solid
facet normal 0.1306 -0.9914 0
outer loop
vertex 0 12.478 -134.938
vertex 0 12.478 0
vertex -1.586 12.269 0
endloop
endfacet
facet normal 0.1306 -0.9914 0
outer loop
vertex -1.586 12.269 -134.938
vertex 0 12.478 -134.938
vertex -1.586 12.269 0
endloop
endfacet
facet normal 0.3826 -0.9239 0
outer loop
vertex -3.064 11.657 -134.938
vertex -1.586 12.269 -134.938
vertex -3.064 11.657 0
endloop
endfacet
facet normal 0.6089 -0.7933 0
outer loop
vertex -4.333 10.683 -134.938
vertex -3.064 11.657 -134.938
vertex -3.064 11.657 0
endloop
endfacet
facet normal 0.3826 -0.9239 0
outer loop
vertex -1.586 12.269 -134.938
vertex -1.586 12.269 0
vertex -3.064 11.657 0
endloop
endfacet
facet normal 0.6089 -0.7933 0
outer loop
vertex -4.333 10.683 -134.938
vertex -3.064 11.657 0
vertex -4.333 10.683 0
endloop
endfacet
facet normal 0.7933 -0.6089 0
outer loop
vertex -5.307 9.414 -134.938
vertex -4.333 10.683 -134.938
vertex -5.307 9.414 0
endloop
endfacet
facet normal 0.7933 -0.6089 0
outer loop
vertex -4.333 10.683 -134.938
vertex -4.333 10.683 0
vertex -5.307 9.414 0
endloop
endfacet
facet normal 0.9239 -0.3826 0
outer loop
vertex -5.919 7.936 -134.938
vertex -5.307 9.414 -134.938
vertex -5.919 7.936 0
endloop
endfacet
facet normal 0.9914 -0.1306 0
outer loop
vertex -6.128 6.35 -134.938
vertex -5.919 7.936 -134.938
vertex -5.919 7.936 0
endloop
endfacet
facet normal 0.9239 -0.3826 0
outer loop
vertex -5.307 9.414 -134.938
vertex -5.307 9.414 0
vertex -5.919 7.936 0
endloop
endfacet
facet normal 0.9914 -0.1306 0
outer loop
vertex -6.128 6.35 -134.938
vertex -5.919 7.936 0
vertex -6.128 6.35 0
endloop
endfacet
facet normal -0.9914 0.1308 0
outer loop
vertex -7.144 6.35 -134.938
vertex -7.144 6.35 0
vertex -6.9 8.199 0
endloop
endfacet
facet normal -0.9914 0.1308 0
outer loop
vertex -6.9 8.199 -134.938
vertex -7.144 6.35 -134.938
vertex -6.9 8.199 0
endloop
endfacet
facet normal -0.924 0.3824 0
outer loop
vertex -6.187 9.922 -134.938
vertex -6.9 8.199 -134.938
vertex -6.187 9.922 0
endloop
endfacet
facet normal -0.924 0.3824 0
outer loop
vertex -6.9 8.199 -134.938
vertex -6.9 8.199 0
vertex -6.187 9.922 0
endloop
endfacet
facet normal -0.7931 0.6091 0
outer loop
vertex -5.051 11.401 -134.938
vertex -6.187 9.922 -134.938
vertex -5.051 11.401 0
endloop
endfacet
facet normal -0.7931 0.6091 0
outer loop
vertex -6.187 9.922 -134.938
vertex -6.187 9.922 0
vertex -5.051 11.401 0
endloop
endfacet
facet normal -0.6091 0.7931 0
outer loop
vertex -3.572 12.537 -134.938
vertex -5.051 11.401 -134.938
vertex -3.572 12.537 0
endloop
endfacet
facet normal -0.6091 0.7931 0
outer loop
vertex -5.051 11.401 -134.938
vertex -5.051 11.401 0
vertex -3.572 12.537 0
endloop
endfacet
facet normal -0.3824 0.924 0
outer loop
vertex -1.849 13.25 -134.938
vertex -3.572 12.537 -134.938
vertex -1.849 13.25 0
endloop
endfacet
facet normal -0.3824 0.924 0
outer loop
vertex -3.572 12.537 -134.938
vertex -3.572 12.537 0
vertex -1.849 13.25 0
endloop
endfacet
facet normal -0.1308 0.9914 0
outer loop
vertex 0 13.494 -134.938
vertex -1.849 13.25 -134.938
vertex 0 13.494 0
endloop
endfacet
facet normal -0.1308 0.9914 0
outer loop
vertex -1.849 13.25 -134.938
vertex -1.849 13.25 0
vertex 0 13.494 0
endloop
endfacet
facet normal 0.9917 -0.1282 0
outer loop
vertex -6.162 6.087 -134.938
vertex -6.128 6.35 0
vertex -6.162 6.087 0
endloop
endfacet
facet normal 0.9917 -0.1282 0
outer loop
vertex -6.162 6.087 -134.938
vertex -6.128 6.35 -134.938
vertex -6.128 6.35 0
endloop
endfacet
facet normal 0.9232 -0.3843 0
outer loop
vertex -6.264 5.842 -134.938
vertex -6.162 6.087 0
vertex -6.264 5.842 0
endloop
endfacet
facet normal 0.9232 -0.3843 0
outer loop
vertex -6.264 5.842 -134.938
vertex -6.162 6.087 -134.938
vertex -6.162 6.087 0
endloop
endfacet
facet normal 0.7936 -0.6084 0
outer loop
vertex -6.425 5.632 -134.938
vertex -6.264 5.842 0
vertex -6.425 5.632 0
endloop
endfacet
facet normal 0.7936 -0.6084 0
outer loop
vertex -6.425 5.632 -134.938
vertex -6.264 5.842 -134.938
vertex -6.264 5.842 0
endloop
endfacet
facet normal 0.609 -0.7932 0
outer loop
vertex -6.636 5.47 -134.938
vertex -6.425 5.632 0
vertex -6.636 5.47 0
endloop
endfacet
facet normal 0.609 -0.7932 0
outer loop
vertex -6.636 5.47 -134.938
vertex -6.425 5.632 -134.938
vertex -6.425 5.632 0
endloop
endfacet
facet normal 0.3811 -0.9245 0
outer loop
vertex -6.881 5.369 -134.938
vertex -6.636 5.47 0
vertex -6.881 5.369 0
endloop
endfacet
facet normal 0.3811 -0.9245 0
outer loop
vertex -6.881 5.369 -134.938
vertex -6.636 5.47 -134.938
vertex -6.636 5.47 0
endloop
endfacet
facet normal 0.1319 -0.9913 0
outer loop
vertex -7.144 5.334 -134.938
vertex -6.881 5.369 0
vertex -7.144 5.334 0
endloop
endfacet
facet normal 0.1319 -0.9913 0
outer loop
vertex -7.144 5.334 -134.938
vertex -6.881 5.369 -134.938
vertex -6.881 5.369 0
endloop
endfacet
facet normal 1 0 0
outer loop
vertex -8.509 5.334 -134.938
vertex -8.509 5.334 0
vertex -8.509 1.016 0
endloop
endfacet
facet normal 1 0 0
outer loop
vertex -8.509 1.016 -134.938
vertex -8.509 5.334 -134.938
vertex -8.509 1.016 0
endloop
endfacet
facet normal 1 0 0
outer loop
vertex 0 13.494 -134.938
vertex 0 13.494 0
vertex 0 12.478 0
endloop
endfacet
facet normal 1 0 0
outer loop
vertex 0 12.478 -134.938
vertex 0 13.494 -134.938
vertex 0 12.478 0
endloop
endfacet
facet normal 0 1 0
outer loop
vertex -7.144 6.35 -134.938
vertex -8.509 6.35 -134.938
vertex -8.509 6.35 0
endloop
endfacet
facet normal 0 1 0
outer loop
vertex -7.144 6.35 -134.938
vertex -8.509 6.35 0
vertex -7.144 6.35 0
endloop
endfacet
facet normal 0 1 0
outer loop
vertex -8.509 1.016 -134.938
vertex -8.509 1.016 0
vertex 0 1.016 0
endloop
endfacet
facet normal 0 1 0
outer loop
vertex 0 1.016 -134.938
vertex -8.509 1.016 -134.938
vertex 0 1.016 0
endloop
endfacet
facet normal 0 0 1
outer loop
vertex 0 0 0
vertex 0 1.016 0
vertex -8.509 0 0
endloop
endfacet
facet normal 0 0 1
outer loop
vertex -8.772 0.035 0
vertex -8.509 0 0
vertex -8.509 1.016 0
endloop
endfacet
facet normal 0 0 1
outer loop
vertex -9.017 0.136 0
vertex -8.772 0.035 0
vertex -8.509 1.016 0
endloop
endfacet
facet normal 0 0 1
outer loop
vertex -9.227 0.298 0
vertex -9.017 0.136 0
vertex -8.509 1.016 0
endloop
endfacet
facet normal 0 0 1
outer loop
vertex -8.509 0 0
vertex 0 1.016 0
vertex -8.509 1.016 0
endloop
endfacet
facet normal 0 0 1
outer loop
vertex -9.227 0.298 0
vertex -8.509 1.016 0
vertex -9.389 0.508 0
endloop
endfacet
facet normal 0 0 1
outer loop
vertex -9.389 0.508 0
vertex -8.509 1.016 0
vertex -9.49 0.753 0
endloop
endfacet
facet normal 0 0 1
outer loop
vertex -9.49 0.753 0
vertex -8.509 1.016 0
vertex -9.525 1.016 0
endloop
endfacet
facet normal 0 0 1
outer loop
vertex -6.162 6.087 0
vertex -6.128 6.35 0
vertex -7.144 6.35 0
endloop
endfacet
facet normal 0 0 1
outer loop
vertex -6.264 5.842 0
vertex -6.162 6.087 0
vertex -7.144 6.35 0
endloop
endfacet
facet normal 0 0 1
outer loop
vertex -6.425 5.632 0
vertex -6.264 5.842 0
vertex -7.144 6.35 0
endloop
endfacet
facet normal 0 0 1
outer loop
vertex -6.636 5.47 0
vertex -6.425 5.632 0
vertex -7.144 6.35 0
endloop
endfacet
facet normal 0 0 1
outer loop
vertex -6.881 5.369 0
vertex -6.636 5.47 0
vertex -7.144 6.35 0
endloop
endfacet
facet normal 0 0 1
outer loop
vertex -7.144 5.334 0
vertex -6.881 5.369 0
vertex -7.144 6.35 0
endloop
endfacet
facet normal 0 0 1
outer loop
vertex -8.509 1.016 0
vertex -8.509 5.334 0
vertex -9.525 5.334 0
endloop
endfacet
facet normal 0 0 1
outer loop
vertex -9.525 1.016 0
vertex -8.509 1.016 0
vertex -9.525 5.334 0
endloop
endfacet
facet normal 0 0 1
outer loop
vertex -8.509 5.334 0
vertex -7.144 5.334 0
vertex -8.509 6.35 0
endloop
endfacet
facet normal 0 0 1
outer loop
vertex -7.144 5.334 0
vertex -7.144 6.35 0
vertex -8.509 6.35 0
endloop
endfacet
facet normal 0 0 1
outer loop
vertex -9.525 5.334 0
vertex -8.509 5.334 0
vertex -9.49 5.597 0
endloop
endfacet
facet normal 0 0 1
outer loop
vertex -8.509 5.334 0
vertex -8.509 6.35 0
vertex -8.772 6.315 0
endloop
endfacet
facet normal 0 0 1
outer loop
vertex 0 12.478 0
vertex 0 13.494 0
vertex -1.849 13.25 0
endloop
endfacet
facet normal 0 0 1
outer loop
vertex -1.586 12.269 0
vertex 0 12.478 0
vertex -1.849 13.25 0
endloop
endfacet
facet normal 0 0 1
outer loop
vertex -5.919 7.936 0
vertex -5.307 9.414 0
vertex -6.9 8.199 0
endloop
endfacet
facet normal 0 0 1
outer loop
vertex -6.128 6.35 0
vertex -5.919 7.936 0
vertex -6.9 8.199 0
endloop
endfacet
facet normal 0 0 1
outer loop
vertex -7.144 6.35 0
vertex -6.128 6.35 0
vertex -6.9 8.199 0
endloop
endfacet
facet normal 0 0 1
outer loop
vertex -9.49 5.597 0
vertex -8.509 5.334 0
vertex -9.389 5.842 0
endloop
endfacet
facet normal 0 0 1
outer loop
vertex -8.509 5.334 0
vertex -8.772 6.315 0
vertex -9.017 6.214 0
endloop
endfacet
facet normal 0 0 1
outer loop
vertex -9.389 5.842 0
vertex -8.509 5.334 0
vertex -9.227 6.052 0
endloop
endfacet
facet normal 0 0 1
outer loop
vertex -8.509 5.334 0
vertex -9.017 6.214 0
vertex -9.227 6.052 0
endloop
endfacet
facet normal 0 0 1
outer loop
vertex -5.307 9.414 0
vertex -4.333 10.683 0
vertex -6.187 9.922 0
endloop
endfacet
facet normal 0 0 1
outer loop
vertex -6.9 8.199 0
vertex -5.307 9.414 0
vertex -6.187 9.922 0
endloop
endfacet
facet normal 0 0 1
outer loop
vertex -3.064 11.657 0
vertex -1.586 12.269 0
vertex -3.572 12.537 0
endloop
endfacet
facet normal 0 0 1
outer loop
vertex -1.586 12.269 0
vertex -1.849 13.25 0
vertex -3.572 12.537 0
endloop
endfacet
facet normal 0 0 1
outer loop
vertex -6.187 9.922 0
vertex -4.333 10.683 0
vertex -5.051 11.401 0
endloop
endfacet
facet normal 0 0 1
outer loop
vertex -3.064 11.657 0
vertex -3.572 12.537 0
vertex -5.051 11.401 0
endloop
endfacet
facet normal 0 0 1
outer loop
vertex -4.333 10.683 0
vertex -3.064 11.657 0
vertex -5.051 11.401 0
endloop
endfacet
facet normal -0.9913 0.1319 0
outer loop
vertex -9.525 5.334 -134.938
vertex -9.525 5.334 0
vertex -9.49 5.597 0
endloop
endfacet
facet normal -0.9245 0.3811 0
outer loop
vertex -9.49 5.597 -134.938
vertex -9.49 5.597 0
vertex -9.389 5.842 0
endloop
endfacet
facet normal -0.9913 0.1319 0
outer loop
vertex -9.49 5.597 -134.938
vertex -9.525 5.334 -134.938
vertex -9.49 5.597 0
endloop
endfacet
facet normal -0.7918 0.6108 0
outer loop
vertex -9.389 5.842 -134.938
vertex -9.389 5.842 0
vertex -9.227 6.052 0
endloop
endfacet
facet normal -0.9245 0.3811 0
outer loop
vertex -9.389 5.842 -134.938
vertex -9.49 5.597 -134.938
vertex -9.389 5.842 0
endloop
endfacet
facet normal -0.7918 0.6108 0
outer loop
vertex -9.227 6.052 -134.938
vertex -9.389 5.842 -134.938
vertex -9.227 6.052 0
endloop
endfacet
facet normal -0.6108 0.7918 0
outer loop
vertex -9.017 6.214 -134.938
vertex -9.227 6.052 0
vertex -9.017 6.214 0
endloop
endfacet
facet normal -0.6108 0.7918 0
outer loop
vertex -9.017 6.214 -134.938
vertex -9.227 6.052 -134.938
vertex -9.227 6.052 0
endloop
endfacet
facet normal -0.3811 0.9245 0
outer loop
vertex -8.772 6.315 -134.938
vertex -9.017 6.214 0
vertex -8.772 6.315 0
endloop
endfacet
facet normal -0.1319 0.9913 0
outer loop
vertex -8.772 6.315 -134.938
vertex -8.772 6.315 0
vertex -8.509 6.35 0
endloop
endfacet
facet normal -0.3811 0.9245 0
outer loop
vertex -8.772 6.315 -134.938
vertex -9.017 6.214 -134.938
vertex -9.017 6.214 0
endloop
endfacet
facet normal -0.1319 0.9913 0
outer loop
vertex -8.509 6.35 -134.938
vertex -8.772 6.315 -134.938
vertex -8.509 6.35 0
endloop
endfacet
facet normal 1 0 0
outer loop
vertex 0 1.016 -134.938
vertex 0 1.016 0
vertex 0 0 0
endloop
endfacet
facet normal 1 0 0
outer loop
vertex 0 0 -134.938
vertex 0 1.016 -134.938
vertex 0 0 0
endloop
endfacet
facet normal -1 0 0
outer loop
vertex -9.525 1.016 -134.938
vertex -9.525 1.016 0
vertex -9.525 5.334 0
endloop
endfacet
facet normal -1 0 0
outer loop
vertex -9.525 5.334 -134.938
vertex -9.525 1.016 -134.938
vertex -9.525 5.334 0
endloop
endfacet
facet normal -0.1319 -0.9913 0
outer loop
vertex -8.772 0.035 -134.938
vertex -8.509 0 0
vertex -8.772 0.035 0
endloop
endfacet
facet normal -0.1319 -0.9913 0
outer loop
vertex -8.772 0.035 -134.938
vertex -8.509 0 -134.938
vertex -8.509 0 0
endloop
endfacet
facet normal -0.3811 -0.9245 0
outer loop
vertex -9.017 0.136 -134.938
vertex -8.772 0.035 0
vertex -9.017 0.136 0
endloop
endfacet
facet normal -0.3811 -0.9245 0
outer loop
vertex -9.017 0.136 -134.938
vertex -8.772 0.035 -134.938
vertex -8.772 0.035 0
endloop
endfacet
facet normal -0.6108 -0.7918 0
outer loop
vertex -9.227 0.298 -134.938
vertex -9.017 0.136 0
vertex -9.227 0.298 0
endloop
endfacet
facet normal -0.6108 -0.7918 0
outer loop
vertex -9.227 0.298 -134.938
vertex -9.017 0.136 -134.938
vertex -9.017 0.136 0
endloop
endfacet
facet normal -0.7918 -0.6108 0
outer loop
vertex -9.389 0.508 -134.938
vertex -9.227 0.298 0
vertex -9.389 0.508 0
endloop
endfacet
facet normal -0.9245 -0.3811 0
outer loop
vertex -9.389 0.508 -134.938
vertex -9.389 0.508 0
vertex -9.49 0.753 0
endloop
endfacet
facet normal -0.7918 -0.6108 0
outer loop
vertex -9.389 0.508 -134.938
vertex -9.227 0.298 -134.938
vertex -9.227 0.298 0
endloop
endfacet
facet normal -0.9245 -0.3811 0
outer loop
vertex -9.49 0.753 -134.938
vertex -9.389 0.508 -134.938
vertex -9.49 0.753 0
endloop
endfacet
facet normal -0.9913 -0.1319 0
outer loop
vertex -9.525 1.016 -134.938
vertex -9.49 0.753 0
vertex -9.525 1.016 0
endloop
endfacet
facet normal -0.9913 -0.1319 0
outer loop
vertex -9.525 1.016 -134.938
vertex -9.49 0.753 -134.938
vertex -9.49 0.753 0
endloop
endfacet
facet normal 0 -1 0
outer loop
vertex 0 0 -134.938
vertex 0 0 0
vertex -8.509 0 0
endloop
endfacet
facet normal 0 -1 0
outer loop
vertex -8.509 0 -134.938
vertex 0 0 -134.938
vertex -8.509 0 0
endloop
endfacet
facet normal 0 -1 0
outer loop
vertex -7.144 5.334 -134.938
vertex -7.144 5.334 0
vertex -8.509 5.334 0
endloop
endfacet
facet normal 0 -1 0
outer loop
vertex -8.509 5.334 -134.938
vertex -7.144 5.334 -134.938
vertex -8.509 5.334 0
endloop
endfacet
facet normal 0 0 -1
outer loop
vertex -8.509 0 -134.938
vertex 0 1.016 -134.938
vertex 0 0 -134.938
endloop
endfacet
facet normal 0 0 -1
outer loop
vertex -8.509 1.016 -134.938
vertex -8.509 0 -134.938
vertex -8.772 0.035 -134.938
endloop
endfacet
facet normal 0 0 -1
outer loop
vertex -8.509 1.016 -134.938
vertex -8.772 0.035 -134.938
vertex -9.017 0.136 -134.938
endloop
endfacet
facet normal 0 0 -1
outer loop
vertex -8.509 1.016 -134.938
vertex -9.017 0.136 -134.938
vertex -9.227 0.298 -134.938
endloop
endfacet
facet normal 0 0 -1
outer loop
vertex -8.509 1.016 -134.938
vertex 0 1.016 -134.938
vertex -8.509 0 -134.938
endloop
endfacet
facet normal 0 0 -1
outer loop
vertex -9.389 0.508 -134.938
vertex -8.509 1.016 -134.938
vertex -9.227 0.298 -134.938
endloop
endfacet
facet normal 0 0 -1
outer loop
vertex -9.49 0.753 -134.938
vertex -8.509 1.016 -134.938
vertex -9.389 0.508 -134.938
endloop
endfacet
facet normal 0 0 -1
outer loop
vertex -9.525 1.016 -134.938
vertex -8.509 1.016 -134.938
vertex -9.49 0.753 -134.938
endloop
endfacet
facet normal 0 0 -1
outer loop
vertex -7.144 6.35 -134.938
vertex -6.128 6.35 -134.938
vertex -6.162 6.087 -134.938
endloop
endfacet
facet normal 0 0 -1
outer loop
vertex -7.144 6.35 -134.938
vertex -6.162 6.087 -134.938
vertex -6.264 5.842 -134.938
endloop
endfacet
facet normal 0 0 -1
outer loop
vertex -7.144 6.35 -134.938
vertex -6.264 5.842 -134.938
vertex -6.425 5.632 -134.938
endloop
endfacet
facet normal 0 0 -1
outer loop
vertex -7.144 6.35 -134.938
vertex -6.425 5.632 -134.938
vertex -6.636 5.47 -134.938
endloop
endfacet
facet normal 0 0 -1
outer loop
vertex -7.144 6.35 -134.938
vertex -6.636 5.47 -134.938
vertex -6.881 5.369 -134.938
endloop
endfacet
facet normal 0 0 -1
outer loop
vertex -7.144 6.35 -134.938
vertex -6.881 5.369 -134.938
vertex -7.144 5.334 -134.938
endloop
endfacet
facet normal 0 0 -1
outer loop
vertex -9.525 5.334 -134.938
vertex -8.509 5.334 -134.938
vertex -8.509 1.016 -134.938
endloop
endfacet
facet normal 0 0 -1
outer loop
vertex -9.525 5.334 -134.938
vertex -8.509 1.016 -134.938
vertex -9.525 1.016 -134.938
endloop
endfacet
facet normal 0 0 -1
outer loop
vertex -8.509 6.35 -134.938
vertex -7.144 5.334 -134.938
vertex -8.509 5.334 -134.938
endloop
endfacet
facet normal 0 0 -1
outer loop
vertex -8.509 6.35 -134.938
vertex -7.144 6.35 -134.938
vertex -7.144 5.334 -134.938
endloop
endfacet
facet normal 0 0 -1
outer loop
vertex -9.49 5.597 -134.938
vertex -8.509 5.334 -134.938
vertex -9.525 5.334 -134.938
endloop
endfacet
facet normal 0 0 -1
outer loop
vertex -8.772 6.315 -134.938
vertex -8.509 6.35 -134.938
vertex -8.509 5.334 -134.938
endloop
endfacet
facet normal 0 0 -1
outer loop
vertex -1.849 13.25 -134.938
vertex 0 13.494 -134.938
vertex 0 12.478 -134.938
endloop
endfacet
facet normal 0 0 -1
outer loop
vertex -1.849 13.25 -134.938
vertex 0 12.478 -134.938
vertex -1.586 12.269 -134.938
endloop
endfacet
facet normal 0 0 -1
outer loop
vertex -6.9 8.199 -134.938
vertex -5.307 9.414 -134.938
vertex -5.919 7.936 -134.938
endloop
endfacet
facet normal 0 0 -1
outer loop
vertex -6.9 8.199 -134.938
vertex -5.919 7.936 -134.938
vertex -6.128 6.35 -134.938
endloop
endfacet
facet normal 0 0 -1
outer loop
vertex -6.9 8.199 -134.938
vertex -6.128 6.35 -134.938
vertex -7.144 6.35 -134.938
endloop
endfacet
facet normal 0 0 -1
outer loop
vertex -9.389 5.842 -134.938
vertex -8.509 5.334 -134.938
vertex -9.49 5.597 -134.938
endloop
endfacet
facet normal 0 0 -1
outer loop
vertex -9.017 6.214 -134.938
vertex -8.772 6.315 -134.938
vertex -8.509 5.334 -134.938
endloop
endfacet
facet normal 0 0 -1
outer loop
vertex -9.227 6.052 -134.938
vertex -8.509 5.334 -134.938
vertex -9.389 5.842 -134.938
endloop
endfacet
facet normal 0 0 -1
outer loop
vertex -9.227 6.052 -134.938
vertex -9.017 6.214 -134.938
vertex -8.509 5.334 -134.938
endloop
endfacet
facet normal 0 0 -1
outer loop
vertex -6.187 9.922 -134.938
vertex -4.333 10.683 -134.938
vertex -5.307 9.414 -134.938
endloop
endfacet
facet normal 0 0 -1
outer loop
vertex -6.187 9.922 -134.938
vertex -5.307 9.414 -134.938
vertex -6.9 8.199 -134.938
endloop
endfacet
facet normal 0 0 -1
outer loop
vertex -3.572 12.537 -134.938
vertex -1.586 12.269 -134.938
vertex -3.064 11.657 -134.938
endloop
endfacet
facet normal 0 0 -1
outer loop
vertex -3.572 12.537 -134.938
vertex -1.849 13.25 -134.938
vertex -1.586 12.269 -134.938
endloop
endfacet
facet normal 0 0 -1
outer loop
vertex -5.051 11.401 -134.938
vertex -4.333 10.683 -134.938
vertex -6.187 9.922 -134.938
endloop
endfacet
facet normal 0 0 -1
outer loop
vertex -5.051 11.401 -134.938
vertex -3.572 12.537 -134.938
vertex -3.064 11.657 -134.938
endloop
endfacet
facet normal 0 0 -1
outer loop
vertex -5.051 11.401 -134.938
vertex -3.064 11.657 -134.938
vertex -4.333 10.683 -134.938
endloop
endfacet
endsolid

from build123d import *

# Parameters (mm, degrees)
EXTRUDE_THIN1_DEPTH = 134.9375
FILLET1_R           = 1.016


with BuildPart() as part:
    # Sketch1 → Extrude-Thin1 (new body)
    with BuildSketch(Plane.XY):
        with BuildLine():
            Line((0, 0), (-9.525, 0))
            Line((-9.525, 0), (-9.525, 6.35))
            Line((-9.525, 6.35), (-7.14375, 6.35))
            ThreePointArc((-7.14375, 6.35), (-5.051394068, 11.401394068), (0, 13.49375))
            Line((0, 13.49375), (0, 12.47775))
            ThreePointArc((0, 12.47775), (-4.678413944, 10.30749454), (-6.042935054, 5.334))
            Line((-6.042935054, 5.334), (-8.509, 5.334))
            Line((-8.509, 5.334), (-8.509, 1.016))
            Line((-8.509, 1.016), (0, 1.016))
            Line((0, 1.016), (0, 0))
        make_face()
    extrude(amount=-EXTRUDE_THIN1_DEPTH)

    # Fillet1
    fillet1_edges = [part.edges().sort_by_distance(p)[0] for p in [
        (-6.042935054, 5.334, -67.46875),
        (-9.525, 0, -67.46875),
        (-9.525, 6.35, -67.46875),
    ]]
    fillet(fillet1_edges, radius=FILLET1_R)


solid = part.part
